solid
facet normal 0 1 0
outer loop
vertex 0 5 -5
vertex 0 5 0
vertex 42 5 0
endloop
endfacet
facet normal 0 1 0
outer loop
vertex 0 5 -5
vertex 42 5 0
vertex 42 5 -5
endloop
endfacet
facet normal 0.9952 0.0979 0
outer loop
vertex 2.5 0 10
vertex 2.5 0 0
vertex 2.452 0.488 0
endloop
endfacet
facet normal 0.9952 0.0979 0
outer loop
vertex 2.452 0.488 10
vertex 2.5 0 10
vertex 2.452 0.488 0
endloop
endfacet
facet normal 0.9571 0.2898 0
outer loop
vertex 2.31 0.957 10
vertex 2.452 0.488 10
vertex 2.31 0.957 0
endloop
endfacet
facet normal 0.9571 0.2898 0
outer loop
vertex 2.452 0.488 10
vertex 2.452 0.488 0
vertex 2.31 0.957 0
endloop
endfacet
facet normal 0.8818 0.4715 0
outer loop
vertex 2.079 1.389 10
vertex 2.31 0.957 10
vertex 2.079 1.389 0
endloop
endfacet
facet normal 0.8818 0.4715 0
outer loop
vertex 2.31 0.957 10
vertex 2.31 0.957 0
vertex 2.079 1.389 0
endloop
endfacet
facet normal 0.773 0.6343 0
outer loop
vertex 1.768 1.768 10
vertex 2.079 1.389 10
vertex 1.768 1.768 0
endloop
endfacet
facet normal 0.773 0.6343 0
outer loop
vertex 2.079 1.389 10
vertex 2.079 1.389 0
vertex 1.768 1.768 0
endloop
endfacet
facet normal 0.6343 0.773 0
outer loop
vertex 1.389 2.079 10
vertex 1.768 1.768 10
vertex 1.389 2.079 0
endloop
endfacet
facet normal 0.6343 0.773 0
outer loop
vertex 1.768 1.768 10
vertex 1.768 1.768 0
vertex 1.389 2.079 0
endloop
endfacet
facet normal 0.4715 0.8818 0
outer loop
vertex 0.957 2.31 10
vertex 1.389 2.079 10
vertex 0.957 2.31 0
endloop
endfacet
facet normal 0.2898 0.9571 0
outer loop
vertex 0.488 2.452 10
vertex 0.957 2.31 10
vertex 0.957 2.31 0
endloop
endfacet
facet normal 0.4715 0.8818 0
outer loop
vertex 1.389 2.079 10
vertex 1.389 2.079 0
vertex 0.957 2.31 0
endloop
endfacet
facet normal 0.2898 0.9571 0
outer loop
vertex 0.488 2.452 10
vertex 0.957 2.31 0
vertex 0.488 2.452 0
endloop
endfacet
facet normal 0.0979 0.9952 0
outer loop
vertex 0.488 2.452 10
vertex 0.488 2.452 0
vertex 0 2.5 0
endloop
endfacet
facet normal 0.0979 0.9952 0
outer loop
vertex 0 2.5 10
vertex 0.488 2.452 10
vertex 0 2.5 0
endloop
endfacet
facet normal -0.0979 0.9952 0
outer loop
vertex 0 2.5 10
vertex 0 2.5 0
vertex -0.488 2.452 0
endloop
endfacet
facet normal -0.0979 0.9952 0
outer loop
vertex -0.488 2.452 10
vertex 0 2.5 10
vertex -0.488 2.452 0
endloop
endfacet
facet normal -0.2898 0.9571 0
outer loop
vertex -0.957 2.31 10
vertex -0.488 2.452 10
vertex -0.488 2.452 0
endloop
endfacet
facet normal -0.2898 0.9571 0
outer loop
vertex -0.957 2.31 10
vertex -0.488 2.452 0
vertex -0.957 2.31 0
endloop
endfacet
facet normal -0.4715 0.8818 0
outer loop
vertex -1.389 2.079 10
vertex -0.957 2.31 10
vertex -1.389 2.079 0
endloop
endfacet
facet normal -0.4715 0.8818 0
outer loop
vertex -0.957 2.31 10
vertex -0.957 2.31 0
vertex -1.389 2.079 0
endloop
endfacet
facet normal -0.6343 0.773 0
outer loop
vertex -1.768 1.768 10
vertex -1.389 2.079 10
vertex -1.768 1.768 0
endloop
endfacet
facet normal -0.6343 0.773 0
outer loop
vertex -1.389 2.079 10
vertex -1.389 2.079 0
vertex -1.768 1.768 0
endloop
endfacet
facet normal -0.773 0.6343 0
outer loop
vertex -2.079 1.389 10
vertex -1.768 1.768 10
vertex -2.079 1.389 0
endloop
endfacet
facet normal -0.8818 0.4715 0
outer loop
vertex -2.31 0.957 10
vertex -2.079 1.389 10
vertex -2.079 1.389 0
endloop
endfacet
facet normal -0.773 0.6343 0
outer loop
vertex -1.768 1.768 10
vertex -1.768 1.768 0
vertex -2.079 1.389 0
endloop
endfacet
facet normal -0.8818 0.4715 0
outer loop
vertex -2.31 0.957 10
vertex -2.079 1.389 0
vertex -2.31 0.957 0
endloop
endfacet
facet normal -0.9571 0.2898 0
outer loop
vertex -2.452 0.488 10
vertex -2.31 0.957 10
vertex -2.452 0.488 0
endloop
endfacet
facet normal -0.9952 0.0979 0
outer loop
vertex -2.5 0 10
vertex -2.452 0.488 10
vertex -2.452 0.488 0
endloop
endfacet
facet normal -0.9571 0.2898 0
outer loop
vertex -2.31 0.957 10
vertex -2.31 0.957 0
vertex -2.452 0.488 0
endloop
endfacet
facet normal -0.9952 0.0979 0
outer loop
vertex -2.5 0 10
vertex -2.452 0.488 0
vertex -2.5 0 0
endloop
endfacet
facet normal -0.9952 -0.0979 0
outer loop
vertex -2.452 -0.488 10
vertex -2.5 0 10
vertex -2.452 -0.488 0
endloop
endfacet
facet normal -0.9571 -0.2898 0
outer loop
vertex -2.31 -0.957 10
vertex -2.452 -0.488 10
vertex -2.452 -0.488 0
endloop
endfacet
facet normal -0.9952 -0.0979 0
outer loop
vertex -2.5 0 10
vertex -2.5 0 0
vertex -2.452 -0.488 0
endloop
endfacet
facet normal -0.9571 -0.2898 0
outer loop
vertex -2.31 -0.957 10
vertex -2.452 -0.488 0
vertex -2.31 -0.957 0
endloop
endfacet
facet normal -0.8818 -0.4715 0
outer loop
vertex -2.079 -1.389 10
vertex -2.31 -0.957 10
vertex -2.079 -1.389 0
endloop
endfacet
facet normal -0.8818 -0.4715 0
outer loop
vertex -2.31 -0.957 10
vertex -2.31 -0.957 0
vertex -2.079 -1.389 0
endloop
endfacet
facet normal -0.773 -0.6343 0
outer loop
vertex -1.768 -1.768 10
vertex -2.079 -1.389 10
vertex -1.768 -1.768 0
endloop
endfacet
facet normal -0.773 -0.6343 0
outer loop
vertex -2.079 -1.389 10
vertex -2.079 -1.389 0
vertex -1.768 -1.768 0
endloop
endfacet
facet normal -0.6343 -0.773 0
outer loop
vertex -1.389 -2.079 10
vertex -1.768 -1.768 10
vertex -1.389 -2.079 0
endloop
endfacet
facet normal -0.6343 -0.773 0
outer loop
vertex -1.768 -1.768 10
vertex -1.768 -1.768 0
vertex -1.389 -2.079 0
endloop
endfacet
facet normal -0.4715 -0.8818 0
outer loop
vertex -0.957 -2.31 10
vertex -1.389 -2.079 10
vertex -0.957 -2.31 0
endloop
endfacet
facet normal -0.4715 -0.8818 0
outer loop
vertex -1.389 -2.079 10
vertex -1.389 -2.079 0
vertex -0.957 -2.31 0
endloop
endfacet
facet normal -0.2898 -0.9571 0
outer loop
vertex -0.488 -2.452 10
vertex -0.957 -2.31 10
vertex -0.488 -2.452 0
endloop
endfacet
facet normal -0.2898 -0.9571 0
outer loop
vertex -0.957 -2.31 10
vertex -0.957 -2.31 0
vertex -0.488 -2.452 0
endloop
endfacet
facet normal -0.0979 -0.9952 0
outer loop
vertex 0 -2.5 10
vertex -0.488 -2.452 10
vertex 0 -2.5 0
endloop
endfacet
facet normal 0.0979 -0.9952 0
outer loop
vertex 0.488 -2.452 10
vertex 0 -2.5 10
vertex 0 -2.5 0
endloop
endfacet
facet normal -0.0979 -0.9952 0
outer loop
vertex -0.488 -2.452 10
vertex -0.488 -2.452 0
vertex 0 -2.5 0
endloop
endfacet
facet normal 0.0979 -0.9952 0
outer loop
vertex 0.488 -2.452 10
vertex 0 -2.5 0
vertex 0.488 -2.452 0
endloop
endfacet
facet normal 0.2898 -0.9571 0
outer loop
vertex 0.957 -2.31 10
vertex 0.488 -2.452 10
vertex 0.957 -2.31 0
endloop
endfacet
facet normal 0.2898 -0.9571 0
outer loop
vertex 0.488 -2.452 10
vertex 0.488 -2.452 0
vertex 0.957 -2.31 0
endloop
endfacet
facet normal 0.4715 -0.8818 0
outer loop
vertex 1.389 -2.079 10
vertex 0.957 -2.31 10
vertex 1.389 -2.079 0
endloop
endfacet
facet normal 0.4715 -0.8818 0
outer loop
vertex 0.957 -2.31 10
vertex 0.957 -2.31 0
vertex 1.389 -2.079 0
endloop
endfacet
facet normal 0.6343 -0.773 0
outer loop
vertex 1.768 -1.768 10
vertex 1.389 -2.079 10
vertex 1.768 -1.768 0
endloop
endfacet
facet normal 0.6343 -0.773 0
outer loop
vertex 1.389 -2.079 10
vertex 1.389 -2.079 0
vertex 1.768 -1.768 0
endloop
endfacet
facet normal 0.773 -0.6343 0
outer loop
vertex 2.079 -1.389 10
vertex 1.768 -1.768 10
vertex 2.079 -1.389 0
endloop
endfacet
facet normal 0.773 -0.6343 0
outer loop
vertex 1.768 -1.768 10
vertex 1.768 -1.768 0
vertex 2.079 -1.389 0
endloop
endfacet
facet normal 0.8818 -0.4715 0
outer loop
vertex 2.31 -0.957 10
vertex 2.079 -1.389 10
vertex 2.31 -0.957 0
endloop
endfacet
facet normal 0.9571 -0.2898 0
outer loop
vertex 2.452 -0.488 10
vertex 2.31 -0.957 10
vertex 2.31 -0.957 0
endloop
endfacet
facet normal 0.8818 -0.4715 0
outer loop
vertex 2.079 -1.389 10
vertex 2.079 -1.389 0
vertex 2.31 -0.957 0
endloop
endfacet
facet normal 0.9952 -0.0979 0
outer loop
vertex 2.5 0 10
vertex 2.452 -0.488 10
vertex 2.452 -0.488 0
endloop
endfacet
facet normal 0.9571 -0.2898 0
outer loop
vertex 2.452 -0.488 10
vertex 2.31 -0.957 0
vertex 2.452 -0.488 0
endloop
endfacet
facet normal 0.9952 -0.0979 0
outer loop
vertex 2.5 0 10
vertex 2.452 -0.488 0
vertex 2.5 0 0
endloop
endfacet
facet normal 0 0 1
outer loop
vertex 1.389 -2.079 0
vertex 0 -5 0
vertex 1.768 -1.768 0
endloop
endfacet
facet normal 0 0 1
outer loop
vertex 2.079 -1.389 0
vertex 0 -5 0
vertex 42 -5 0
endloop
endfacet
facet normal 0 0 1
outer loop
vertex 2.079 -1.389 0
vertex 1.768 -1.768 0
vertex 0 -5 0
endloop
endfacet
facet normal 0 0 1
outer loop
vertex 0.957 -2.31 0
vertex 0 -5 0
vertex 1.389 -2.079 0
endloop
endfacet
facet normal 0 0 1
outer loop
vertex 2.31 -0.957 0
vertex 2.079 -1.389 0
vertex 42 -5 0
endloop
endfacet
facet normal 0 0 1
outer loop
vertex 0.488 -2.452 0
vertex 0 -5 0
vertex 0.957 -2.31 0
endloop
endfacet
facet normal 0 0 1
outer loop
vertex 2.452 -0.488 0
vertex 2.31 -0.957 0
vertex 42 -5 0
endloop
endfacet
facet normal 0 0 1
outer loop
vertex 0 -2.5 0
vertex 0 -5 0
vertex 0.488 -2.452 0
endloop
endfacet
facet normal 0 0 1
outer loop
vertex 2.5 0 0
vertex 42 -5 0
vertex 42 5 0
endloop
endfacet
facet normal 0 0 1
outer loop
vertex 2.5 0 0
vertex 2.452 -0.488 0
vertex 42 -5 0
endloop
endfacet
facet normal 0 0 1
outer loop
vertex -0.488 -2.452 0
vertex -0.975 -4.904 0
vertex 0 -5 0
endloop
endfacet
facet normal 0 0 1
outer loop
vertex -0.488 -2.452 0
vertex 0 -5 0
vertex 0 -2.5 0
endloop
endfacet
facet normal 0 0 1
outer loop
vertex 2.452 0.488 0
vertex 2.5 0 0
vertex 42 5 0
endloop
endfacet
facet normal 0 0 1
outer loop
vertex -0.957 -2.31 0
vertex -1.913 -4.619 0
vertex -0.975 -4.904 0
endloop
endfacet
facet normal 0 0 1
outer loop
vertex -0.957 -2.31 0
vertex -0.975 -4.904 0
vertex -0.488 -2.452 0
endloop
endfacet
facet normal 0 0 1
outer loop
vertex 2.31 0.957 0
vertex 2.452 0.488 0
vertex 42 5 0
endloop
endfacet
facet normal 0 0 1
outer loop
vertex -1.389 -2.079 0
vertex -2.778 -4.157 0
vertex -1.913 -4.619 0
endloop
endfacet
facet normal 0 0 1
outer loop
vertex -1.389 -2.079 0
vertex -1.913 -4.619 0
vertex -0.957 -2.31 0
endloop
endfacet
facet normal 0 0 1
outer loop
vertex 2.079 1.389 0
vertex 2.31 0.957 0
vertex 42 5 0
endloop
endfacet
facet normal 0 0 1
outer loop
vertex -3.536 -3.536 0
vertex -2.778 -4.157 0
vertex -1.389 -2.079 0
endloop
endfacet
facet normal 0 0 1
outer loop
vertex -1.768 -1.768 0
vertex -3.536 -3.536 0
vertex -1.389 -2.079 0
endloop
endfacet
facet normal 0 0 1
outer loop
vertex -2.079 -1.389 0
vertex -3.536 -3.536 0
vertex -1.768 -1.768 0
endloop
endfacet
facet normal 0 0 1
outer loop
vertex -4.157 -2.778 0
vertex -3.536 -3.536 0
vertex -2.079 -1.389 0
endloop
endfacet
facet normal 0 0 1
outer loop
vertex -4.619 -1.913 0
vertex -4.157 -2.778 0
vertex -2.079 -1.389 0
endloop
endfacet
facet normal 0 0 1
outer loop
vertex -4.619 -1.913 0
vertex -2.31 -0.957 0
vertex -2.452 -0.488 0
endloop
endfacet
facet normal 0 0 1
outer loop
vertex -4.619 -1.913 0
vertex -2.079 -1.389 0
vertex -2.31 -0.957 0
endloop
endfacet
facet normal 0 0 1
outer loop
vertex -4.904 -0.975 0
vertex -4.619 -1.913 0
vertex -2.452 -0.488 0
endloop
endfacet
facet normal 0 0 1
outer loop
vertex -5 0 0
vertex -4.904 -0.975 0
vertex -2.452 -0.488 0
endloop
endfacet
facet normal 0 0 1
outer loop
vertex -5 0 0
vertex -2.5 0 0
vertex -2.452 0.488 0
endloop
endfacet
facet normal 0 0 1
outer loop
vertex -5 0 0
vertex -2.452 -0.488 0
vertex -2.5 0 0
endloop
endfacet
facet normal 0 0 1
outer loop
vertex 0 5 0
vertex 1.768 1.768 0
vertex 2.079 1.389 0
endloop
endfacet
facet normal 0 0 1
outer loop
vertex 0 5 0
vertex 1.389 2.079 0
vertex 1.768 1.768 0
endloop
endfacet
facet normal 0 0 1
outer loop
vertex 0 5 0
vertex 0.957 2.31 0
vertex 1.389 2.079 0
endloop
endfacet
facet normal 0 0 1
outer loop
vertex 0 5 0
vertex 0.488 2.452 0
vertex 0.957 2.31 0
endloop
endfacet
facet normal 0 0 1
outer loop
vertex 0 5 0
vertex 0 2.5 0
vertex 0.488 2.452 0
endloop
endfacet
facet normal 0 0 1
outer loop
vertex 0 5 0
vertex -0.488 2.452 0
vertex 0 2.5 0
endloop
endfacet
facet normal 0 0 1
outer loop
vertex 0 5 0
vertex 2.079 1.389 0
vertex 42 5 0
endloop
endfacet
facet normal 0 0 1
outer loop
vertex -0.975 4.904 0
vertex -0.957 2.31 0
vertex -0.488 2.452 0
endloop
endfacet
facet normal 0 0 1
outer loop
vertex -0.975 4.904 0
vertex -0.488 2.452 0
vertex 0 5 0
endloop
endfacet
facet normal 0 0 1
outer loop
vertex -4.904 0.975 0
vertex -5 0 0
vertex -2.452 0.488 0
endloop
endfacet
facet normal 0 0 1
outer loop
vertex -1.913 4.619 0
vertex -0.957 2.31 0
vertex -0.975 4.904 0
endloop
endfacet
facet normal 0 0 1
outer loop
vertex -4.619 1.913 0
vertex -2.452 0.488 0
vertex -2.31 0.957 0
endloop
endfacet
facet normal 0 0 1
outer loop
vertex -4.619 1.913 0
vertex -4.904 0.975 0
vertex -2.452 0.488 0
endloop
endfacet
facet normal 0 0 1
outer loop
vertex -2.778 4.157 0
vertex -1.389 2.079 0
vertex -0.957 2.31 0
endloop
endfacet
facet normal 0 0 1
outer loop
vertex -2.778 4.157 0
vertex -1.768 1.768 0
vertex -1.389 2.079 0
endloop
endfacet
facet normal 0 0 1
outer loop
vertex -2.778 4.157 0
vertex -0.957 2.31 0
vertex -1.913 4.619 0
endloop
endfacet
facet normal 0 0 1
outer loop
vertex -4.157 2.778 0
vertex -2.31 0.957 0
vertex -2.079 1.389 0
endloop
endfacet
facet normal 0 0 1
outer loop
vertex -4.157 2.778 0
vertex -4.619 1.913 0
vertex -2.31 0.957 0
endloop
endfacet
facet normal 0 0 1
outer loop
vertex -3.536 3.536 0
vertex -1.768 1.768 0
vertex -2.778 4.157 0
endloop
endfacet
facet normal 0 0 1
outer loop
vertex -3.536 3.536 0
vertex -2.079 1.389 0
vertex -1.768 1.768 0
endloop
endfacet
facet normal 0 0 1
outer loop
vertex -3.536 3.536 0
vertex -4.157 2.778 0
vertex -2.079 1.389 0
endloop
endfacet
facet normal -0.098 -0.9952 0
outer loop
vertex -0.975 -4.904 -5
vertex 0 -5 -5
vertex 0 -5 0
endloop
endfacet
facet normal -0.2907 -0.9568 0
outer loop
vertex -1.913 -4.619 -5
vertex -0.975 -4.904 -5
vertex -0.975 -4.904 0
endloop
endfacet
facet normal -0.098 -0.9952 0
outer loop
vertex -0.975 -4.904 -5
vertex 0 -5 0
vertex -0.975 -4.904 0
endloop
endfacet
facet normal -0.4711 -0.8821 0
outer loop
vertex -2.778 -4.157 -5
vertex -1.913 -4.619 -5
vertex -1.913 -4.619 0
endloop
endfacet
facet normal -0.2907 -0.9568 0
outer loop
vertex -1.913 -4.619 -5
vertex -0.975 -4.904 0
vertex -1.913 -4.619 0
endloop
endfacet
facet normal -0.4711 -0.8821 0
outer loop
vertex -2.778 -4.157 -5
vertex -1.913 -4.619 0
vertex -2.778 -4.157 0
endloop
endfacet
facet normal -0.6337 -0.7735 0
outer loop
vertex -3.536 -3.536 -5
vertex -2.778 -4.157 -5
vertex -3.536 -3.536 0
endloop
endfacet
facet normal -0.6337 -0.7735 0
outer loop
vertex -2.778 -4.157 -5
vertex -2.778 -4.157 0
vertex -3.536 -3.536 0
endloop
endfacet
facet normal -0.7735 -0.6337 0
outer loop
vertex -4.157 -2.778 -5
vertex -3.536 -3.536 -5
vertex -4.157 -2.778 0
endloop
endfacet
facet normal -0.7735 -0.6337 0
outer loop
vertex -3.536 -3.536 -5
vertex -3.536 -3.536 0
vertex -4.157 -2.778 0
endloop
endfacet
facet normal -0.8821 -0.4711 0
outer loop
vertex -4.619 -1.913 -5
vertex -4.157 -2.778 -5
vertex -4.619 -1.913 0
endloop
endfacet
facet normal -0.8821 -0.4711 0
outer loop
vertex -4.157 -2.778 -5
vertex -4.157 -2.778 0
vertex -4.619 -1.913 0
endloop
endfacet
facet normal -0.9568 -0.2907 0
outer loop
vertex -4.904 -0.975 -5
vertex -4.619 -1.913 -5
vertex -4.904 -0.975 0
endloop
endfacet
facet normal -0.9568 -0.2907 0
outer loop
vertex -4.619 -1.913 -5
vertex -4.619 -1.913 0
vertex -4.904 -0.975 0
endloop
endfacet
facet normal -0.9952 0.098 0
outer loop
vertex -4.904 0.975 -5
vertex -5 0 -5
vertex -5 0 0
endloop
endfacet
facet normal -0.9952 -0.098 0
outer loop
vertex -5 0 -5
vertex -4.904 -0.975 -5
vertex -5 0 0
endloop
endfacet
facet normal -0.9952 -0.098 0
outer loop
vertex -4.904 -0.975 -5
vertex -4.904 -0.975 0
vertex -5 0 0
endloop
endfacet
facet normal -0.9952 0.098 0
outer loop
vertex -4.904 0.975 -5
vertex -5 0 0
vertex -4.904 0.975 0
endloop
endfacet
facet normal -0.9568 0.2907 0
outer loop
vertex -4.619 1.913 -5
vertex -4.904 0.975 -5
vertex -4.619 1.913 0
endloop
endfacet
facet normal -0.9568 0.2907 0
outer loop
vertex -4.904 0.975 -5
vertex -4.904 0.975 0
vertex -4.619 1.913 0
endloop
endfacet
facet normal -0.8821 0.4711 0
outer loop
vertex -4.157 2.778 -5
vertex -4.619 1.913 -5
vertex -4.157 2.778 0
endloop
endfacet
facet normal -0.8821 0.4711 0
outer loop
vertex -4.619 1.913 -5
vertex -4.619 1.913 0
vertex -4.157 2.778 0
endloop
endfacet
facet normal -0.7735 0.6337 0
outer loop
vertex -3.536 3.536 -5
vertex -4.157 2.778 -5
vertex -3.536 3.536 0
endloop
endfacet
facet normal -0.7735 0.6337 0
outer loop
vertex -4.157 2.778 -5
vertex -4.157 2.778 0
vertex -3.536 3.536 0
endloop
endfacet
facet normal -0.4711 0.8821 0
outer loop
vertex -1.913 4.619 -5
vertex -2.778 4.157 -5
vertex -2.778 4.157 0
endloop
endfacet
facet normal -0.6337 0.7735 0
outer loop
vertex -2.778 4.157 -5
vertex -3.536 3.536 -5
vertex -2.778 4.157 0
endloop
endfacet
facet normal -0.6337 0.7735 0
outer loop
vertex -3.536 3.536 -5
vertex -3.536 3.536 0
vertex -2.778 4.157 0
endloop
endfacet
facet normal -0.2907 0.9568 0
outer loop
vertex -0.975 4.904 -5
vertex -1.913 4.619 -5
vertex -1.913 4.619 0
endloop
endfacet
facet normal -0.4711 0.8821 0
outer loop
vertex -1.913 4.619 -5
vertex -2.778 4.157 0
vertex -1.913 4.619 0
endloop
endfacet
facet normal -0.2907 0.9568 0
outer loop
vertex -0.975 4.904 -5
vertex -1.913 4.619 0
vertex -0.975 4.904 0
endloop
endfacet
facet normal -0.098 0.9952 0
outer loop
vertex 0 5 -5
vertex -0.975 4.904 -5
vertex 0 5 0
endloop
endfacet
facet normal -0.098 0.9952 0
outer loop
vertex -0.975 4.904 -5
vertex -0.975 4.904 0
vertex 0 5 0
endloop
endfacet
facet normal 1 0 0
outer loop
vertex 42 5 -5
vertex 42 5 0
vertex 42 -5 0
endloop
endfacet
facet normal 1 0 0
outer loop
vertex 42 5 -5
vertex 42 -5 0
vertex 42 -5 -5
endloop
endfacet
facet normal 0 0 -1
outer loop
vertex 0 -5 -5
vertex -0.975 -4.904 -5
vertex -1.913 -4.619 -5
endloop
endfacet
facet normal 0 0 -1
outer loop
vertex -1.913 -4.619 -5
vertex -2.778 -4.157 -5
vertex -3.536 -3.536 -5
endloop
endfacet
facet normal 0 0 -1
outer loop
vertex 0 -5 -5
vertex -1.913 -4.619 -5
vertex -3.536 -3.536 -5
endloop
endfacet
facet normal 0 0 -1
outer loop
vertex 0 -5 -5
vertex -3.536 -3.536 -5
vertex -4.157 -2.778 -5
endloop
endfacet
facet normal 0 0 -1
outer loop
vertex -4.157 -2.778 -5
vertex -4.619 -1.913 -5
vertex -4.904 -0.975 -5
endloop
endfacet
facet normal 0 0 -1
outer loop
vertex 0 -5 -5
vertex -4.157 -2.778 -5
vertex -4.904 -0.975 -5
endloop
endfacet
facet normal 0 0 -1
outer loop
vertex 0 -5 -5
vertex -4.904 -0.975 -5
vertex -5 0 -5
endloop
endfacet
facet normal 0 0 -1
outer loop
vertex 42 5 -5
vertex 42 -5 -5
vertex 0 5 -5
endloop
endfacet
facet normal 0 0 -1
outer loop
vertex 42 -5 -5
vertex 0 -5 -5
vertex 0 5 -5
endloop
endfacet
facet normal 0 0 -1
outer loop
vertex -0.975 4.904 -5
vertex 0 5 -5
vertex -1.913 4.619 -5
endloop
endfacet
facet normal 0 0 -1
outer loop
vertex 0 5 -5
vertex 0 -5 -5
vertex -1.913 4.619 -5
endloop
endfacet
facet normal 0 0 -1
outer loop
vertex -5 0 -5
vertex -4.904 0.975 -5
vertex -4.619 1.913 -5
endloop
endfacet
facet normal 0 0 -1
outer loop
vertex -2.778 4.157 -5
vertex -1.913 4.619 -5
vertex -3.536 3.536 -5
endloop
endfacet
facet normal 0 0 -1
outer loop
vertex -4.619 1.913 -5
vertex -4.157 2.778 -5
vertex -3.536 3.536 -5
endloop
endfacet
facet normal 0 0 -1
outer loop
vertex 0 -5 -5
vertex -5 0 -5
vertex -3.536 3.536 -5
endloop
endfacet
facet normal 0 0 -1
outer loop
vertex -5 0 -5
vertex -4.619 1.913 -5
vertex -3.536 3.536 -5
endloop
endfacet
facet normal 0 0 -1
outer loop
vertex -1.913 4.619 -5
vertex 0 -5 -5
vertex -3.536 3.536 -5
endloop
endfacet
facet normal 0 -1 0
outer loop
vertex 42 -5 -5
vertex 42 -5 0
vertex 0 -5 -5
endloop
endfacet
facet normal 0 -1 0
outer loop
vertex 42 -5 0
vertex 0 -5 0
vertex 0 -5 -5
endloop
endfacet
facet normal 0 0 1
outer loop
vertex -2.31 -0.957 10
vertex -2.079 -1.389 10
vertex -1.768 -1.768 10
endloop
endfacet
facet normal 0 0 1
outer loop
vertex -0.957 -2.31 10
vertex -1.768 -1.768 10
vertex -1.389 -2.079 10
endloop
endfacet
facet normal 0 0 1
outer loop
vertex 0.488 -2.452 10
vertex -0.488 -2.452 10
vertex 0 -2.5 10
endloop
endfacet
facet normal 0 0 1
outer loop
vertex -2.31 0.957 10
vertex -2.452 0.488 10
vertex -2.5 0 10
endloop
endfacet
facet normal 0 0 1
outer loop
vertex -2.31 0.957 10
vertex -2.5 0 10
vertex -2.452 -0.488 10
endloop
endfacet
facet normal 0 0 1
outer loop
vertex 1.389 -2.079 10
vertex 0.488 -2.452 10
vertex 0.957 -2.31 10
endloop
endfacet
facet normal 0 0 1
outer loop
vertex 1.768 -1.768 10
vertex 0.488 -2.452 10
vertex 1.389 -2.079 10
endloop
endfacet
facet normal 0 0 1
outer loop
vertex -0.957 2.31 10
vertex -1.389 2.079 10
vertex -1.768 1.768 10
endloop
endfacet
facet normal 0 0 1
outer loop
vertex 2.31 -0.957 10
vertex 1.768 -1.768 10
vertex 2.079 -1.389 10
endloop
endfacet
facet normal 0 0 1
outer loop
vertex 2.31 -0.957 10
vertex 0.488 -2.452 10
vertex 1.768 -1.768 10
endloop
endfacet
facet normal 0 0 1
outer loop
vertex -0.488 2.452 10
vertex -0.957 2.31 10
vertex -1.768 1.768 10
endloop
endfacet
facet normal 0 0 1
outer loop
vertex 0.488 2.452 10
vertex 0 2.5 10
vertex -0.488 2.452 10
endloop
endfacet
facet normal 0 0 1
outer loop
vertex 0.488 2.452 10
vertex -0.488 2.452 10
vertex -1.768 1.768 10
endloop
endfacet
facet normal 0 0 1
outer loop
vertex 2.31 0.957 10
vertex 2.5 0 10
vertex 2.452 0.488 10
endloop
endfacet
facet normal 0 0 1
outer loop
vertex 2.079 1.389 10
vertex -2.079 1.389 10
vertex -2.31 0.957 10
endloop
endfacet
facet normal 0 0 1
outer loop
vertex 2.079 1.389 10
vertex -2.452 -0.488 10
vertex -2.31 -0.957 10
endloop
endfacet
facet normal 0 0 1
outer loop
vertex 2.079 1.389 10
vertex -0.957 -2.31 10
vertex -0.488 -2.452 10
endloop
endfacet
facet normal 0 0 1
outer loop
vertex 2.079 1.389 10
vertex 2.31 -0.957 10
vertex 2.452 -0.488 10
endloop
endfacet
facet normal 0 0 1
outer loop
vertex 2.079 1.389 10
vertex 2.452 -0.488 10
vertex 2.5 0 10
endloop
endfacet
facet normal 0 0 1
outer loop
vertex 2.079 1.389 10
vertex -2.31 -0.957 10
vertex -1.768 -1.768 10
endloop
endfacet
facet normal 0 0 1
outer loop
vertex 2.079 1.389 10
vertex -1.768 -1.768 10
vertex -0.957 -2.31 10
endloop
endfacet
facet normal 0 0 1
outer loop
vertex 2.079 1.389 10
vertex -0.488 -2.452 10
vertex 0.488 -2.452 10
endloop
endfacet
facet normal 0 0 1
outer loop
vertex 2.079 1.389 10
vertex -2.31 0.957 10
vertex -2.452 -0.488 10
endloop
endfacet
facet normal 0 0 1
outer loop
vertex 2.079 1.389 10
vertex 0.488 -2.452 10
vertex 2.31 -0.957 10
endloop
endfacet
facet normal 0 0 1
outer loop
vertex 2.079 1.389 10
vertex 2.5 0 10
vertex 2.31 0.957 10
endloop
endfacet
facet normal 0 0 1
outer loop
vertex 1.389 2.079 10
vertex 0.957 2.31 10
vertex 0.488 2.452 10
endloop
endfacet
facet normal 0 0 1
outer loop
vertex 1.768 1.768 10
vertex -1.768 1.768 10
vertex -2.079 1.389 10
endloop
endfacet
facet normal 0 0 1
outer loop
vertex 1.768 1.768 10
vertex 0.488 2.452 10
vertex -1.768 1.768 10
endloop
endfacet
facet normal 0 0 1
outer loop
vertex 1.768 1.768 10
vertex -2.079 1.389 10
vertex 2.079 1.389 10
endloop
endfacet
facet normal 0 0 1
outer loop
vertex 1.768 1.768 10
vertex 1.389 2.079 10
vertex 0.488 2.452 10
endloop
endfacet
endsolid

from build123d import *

# Parameters (mm, degrees)
SKETCH1_R                = 2.5
BOSS_EXTRUDE1_DEPTH      = 10
SKETCH2_R                = 5
BOSS_EXTRUDE2_DEPTH      = 5
BOSS_EXTRUDE3_REACH      = 20.708
BOSS_EXTRUDE3_END_RADIUS = 5
SKETCH4_W                = 5
SKETCH4_H                = 10
SKETCH5_W                = 5
SKETCH5_H                = 10
BOSS_EXTRUDE4_DEPTH      = 32


with BuildPart() as part:
    # Sketch1 → Boss-Extrude1 (new body)
    with BuildSketch(Plane.XY):
        Circle(SKETCH1_R)
    extrude(amount=BOSS_EXTRUDE1_DEPTH)

    # Sketch2 → Boss-Extrude2 (add)
    with BuildSketch(Plane(origin=(0, 0, 0), x_dir=(-1, 0, 0), z_dir=(0, 0, -1))):
        Circle(SKETCH2_R)
    extrude(amount=BOSS_EXTRUDE2_DEPTH)

    # Boss-Extrude3: up to this cylinder (the profile starts outside it)
    boss_extrude3_end = Plane(origin=(0, 0, -2.5), z_dir=(0, 0, 1)) * Cylinder(BOSS_EXTRUDE3_END_RADIUS, 52.416, mode=Mode.PRIVATE)
    # Sketch4 → Boss-Extrude3 (add, up to the surface)
    with BuildSketch(Plane(origin=(10, 0, 0), x_dir=(0, 0, -1), z_dir=(1, 0, 0)), mode=Mode.PRIVATE) as boss_extrude3_sk1:
        with Locations((2.5, 0)):
            Rectangle(SKETCH4_W, SKETCH4_H)
    boss_extrude3_tool1 = extrude(boss_extrude3_sk1.sketch, amount=-BOSS_EXTRUDE3_REACH, mode=Mode.PRIVATE) - boss_extrude3_end
    add(boss_extrude3_tool1.solids().sort_by_distance((10, 0, -2.5))[0])

    # Sketch5 → Boss-Extrude4 (add)
    with BuildSketch(Plane(origin=(10, 0, 0), x_dir=(0, 0, -1), z_dir=(1, 0, 0))):
        with Locations((2.5, 0)):
            Rectangle(SKETCH5_W, SKETCH5_H)
    extrude(amount=BOSS_EXTRUDE4_DEPTH)


solid = part.part
